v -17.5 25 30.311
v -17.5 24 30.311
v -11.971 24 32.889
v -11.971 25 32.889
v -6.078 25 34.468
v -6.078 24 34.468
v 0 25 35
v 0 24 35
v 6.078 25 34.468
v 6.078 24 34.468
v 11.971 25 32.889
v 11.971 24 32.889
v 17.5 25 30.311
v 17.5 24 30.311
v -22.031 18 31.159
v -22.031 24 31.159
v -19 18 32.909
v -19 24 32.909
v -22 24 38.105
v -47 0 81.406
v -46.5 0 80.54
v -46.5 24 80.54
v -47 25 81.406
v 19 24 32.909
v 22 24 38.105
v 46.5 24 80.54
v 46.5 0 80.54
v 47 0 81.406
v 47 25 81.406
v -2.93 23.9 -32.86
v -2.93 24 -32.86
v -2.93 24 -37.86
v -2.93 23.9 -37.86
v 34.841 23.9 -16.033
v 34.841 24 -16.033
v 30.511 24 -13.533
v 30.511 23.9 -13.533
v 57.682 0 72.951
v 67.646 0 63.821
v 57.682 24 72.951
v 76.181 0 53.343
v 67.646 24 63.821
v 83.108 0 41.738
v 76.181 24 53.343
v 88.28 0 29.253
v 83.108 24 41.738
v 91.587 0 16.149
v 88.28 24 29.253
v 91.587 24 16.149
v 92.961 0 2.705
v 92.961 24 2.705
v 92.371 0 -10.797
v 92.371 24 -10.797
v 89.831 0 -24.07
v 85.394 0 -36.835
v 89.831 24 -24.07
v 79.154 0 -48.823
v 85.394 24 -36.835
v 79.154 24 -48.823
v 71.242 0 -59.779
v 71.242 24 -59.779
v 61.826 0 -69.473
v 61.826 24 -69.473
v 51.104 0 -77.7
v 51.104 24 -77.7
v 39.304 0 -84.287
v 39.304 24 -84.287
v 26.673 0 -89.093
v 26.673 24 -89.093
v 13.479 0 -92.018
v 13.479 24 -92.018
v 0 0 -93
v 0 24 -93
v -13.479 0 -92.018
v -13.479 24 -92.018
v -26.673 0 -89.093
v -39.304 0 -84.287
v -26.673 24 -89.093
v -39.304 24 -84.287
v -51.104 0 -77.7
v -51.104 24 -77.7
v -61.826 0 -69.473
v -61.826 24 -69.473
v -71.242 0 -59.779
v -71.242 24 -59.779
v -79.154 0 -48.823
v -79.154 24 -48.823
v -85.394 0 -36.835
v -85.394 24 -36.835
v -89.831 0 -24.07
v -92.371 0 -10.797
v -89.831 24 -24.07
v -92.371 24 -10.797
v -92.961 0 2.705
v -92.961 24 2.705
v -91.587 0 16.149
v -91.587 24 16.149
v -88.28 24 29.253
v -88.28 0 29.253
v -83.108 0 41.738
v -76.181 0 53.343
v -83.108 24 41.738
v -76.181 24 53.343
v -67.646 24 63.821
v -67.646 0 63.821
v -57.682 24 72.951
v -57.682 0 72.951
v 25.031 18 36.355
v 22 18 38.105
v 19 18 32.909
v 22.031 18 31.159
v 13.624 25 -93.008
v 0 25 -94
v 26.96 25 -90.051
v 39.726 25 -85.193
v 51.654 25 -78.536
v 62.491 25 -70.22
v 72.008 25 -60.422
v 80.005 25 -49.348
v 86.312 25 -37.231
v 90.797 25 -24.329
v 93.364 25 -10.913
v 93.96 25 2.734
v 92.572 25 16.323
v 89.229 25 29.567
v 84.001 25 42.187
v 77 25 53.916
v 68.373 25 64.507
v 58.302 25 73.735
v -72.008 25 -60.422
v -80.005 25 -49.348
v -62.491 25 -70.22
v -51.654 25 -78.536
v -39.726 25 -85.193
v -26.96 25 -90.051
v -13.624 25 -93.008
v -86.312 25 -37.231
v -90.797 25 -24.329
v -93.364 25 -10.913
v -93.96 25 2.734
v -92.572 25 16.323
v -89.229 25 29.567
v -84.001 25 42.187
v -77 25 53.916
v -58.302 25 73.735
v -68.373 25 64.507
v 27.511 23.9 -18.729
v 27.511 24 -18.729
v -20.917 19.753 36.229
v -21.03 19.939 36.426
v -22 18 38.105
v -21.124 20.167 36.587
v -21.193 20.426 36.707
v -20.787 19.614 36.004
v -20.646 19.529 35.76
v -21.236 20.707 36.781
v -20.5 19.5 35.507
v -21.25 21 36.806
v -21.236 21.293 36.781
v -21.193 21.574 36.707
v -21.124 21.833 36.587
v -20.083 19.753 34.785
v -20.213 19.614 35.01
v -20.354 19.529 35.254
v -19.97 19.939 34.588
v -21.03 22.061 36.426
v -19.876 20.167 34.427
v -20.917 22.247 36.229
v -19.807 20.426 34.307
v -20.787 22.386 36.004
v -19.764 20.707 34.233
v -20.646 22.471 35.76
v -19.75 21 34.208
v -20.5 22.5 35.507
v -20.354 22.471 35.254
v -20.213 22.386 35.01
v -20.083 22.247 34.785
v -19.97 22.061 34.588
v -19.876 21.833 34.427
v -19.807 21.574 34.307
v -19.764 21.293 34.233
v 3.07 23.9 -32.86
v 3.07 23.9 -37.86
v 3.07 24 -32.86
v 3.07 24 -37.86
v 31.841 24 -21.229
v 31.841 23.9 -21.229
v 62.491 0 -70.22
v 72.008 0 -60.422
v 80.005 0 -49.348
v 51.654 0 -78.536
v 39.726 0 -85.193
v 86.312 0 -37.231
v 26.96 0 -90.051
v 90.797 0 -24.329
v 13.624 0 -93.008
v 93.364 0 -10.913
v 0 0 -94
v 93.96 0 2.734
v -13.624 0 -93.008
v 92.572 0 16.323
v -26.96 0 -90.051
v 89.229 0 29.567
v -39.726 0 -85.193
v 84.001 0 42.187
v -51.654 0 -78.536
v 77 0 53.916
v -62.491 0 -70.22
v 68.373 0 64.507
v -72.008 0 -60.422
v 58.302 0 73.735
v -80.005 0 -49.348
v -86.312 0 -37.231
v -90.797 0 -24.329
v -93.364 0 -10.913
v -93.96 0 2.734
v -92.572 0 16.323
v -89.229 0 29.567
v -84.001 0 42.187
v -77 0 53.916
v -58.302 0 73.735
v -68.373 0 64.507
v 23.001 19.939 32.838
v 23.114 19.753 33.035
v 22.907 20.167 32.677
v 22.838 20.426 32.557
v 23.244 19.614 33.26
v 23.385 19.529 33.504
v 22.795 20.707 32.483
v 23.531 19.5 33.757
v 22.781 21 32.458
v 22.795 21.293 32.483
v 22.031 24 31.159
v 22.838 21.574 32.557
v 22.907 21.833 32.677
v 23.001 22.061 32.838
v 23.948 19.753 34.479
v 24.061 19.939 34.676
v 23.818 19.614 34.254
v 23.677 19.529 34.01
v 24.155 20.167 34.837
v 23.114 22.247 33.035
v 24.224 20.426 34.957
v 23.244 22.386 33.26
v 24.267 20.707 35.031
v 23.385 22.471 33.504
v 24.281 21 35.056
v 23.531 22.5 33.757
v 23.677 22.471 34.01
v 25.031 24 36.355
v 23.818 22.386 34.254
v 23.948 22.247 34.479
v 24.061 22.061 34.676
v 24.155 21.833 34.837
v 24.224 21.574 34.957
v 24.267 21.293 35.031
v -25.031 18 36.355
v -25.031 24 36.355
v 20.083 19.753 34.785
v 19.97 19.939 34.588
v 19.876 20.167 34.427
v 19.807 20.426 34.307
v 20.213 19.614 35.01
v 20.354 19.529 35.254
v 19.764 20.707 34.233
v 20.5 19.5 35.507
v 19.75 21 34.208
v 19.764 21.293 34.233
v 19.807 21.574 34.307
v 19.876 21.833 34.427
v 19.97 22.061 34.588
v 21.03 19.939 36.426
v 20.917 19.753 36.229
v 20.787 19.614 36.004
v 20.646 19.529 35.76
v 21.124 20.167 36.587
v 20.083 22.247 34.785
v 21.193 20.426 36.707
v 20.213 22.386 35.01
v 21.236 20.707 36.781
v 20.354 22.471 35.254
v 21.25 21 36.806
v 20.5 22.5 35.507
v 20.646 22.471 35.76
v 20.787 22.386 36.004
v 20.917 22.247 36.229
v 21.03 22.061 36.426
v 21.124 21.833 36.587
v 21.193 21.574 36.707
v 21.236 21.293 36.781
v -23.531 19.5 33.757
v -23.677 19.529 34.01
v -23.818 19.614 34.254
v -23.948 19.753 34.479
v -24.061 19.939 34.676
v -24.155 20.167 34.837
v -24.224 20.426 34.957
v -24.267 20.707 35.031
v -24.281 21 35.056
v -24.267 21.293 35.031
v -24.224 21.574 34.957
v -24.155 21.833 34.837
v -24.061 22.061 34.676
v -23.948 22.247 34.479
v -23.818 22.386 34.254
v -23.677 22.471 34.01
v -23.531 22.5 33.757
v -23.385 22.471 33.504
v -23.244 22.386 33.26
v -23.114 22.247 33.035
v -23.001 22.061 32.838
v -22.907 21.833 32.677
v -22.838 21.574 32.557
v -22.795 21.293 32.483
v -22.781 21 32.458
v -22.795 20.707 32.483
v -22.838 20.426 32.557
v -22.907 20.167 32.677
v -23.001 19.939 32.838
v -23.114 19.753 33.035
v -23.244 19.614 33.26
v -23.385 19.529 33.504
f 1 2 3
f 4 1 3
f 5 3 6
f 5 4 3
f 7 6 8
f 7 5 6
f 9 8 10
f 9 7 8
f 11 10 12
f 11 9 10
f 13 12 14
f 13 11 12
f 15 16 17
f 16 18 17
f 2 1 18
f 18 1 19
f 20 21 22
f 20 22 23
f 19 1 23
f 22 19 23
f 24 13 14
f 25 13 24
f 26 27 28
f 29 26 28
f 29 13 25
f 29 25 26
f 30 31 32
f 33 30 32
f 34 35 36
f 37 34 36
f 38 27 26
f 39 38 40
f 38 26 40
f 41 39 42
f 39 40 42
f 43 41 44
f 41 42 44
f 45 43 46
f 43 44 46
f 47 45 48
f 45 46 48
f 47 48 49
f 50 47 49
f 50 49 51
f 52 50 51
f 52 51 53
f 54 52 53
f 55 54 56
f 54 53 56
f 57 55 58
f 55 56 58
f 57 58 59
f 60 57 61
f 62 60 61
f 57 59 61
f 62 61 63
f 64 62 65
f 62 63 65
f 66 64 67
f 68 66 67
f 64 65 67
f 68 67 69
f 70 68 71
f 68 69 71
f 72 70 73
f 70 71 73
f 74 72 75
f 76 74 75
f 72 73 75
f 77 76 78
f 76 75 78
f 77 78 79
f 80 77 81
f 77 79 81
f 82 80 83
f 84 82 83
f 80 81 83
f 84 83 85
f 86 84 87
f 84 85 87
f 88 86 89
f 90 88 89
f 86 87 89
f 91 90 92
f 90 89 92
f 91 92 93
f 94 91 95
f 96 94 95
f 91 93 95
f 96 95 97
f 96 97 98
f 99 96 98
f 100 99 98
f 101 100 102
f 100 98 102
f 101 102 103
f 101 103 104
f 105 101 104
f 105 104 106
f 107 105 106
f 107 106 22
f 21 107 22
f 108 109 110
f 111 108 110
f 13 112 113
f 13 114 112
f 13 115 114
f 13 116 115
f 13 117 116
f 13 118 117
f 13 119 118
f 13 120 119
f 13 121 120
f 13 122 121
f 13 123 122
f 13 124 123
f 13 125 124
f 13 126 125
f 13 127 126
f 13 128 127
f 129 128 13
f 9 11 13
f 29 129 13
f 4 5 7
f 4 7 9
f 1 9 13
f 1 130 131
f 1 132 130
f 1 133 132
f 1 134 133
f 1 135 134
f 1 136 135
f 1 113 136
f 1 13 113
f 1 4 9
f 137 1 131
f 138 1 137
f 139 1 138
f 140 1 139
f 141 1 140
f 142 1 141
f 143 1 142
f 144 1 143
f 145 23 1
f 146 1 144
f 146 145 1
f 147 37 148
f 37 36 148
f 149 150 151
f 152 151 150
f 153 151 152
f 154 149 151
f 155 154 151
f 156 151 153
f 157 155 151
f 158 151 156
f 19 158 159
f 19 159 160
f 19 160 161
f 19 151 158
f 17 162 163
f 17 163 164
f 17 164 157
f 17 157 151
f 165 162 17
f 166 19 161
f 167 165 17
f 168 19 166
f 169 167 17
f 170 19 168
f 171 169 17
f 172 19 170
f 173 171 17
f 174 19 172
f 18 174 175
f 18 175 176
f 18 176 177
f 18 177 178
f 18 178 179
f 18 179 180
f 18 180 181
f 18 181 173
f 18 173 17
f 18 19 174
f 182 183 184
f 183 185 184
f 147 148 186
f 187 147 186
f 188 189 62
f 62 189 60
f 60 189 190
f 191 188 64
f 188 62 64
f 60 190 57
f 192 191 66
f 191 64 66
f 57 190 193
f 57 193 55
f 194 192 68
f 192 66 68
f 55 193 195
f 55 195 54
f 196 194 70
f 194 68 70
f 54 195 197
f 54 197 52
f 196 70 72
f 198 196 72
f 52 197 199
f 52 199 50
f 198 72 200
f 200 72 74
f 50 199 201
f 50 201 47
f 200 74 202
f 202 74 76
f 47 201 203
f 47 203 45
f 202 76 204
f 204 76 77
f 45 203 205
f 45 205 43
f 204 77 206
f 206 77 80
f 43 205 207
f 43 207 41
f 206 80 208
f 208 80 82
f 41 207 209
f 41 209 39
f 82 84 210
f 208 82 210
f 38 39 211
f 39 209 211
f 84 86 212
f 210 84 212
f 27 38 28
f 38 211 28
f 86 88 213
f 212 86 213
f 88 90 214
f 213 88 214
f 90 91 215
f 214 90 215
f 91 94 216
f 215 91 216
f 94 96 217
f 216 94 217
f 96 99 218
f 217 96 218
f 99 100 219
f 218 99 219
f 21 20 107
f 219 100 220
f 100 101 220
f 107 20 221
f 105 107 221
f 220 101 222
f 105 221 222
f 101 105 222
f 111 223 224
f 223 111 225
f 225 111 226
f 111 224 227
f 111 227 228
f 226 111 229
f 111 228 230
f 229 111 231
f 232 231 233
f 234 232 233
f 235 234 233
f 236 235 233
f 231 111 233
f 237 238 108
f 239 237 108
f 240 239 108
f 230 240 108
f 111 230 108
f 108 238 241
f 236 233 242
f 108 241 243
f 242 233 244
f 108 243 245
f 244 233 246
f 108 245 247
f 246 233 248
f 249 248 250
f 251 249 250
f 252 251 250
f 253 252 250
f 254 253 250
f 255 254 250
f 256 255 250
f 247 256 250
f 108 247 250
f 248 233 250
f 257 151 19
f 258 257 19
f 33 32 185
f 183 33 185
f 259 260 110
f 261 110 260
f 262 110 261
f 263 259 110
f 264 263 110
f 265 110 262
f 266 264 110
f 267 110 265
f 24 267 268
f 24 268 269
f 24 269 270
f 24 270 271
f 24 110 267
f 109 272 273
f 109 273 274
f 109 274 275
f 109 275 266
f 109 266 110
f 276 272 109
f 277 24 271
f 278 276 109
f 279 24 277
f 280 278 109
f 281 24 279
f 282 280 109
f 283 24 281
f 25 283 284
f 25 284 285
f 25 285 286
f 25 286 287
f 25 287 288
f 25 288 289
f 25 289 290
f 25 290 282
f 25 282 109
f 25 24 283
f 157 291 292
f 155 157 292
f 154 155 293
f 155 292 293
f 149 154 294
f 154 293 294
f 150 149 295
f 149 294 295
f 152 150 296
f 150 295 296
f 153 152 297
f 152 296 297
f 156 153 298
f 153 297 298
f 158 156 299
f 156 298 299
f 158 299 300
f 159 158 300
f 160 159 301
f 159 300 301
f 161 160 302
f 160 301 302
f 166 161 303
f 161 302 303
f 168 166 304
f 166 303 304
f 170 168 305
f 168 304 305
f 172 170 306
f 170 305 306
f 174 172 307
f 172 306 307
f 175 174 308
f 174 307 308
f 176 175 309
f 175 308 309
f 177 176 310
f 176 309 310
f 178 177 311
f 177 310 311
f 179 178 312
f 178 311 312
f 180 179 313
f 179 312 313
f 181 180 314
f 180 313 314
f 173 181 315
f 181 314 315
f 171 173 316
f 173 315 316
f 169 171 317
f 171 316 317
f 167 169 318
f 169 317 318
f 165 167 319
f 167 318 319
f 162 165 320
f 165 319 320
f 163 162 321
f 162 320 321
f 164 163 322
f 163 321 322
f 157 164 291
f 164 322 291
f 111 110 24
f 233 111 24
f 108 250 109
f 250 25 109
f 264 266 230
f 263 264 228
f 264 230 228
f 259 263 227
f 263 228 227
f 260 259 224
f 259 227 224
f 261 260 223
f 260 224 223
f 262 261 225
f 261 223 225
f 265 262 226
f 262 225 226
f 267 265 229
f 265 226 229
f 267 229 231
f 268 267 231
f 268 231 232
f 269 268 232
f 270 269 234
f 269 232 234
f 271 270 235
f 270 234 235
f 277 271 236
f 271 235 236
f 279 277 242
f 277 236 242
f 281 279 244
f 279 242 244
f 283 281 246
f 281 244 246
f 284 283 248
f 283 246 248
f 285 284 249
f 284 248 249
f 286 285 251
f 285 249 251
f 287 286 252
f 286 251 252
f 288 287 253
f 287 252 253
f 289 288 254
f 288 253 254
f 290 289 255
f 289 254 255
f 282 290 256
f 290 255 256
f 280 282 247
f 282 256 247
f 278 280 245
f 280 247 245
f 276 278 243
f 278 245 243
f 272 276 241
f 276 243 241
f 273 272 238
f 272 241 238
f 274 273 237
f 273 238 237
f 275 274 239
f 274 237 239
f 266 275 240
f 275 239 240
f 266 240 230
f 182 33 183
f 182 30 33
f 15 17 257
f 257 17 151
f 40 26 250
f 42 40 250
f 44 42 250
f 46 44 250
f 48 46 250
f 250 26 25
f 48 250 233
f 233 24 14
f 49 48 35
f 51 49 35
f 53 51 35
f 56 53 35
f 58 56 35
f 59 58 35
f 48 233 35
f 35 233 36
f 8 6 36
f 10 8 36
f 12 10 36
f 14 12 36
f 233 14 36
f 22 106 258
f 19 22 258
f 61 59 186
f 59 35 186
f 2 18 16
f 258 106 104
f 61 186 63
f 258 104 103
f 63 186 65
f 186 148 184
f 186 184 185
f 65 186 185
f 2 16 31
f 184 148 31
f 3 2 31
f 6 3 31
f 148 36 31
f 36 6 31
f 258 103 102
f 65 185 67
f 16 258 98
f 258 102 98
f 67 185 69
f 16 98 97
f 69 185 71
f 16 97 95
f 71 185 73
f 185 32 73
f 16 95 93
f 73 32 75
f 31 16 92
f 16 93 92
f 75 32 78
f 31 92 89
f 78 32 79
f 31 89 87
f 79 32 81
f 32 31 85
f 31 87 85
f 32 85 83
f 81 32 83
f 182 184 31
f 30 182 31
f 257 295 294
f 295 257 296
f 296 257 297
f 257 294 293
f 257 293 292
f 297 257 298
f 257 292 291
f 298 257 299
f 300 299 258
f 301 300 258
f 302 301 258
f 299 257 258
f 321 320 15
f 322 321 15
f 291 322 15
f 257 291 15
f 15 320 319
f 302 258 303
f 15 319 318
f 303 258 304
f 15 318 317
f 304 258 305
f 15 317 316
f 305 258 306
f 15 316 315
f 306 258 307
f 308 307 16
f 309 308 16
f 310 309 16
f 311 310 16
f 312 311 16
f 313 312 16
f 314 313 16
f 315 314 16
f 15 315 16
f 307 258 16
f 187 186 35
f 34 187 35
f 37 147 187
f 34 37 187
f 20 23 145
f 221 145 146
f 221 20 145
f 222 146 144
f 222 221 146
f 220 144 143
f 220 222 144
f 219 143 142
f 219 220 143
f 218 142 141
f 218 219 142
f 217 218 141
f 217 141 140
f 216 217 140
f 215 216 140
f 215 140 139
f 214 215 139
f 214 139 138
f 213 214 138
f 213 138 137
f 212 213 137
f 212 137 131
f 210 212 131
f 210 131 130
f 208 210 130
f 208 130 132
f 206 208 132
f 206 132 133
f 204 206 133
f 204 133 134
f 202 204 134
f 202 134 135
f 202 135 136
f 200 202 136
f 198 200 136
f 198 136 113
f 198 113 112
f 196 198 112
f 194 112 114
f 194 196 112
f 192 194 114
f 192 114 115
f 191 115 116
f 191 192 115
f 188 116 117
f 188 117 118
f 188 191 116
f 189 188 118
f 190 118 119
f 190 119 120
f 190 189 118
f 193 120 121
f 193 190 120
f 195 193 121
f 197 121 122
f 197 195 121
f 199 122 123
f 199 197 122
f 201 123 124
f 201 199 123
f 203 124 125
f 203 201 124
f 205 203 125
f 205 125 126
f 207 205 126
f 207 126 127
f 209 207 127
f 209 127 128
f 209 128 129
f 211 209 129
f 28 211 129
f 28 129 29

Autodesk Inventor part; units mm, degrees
ref_plane "YZ Plane" through (0, 0, 0) normal (1, 0, 0) x (0, 1, 0)
ref_plane "XZ Plane" through (0, 0, 0) normal (0, 1, 0) x (-1, 0, 0)
ref_plane "XY Plane" through (0, 0, 0) normal (0, 0, 1) x (1, 0, 0)
sketch "Sketch1" plane through (0, 0, 0) normal (0, 1, 0) x (-1, 0, 0)
  circle A0 centre (0, 0) radius 94
  dimension "d0" = 188
extrude "Extrusion1" add sketch "Sketch1" along normal blind 25
sketch "Sketch2" plane through (0, 0, 0) normal (0, -1, 0) x (1, 0, 0)
  point P0 (0, 0)
  point P1 (0, 0)
hole "Hole1" at (0, 0, 0) direction (0, 1, 0) diameter 186 depth 24
sketch "Sketch11" plane through (0, 25, 0) normal (0, 1, 0) x (1, 0, 0)
  circle A0 centre (0, 0) radius 94.1047
  circle A1 centre (0, 0) radius 35
  line L0 (35, 0) -> (94.1047, 0)
  line L1 (17.5, 30.3109) -> (47.0523, 81.4971)
  line L2 (-17.5, 30.3109) -> (-47.0523, 81.4971)
  line L3 (-35, 0) -> (-94.1047, 0)
  line L4 (-17.5, -30.3109) -> (-47.0523, -81.4971)
  line L5 (17.5, -30.3109) -> (47.0523, -81.4971)
  dimension "d46" = 70
  dimension "d49" = 360
extrude "Extrusion4" cut sketch "Sketch11" against normal blind 30 contours A0 L4 A1 L5
sketch "Sketch5" plane through (0, 24, 0) normal (0, -1, 0) x (1, 0, 0)
  circle A0 centre (0.0185, 0.5394) radius 32.5
  circle A1 centre (0.0185, 0.5394) radius 91
  line L0 (0.0185, -31.9606) -> (0.0185, -90.4606)
  line L1 (-28.1273, -15.7106) -> (-78.7898, -44.9606)
  line L2 (-28.1273, 16.7894) -> (-78.7898, 46.0394)
  line L3 (0.0185, 33.0394) -> (0.0185, 91.5394)
  line L4 (28.1643, 16.7894) -> (78.8268, 46.0394)
  line L5 (27.2527, -15.1843) -> (78.8268, -44.9606)
  line L6 (30.5108, -13.5333) -> (27.5108, -18.7294)
  line L7 (27.5108, -18.7294) -> (31.8409, -21.2294)
  line L8 (31.8409, -21.2294) -> (34.8409, -16.0333)
  line L9 (34.8409, -16.0333) -> (30.5108, -13.5333)
  line L10 (-2.9302, -37.8595) -> (3.0698, -37.8595)
  line L11 (3.0698, -32.8595) -> (-2.9302, -32.8595)
  line L12 (-2.9302, -32.8595) -> (-2.9302, -37.8595)
  line L13 (3.0698, -37.8595) -> (3.0698, -32.8595)
  point P0 (0, 0)
  point P1 (24.0416, -20.6125)
  point P2 (3.0698, -35.3595)
  dimension "d23" = 65
  dimension "d30" = 360
  dimension "d38" = 6
  dimension "d39" = 5
  dimension "d40" = 6
  dimension "d41" = 5
extrude "Extrusion3" add sketch "Sketch5" along normal blind 0.1 contours L6 L9 L8 L5 | L5 L8 L7 L6 | L11 L13 L10 L0 | L0 L10 L12 L11
sketch "Sketch12" plane through (-47, 0, 81.4064) normal (0.8660254, 0, 0.5) x (0.5, 0, -0.8660254)
  point P0 (94, 0)
sketch "Sketch13" plane through (-47, 0, 81.4064) normal (0.8660254, 0, 0.5) x (0.5, 0, -0.8660254)
  line L0 (59, 24) -> (1, 24) projected
  line L1 (50, 24) -> (56, 24)
  line L2 (56, 24) -> (56, 18)
  line L3 (56, 18) -> (50, 18)
  line L4 (50, 18) -> (50, 24)
  line L5 (59, 25) -> (59, 24) projected
  point P0 (94, 0)
  dimension "d53" = 6
  dimension "d54" = 6
  dimension "d55" = 3
extrude "Extrusion5" add sketch "Sketch13" against normal blind 3.5
sketch "Sketch14" plane through (-47, 0, 81.4064) normal (0.8660254, 0, 0.5) x (0.5, 0, -0.8660254)
  circle A0 centre (53, 21) radius 1.5
  line L0 (50, 24) -> (50, 18) projected
  line L1 (50, 18) -> (56, 18) projected
  point P0 (94, 0)
  dimension "d58" = 3
  dimension "d59" = 3
  dimension "d60" = 3
hole "Hole2" at (-20.5, 21, 35.507) direction (-0.8660254, 0, -0.5) diameter 3 depth 29
sketch "Sketch15" plane through (47, 0, 81.4064) normal (-0.8660254, 0, 0.5) x (0.5, 0, 0.8660254)
  line L0 (-56, 24) -> (-50, 24)
  line L1 (-50, 24) -> (-50, 18)
  line L2 (-50, 18) -> (-56, 18)
  line L3 (-56, 18) -> (-56, 24)
  line L4 (-59, 25) -> (-59, 24) projected
  line L5 (-1, 24) -> (-59, 24) projected
  point P0 (-94, 0)
  dimension "d68" = 6
  dimension "d69" = 6
  dimension "d70" = 3
  dimension "d71" = 0
extrude "Extrusion6" add sketch "Sketch15" against normal blind 3.5
sketch "Sketch16" plane through (47, 0, 81.4064) normal (-0.8660254, 0, 0.5) x (0.5, 0, 0.8660254)
  circle A0 centre (-53, 21) radius 1.5
  line L0 (-56, 24) -> (-56, 18) projected
  line L1 (-50, 24) -> (-56, 24) projected
  point P0 (-94, 0)
  dimension "d74" = 3
  dimension "d75" = 3
  dimension "d76" = 3
hole "Hole3" at (20.5, 21, 35.507) direction (0.8660254, 0, -0.5) diameter 3 depth 29
properties part number "Cover"
